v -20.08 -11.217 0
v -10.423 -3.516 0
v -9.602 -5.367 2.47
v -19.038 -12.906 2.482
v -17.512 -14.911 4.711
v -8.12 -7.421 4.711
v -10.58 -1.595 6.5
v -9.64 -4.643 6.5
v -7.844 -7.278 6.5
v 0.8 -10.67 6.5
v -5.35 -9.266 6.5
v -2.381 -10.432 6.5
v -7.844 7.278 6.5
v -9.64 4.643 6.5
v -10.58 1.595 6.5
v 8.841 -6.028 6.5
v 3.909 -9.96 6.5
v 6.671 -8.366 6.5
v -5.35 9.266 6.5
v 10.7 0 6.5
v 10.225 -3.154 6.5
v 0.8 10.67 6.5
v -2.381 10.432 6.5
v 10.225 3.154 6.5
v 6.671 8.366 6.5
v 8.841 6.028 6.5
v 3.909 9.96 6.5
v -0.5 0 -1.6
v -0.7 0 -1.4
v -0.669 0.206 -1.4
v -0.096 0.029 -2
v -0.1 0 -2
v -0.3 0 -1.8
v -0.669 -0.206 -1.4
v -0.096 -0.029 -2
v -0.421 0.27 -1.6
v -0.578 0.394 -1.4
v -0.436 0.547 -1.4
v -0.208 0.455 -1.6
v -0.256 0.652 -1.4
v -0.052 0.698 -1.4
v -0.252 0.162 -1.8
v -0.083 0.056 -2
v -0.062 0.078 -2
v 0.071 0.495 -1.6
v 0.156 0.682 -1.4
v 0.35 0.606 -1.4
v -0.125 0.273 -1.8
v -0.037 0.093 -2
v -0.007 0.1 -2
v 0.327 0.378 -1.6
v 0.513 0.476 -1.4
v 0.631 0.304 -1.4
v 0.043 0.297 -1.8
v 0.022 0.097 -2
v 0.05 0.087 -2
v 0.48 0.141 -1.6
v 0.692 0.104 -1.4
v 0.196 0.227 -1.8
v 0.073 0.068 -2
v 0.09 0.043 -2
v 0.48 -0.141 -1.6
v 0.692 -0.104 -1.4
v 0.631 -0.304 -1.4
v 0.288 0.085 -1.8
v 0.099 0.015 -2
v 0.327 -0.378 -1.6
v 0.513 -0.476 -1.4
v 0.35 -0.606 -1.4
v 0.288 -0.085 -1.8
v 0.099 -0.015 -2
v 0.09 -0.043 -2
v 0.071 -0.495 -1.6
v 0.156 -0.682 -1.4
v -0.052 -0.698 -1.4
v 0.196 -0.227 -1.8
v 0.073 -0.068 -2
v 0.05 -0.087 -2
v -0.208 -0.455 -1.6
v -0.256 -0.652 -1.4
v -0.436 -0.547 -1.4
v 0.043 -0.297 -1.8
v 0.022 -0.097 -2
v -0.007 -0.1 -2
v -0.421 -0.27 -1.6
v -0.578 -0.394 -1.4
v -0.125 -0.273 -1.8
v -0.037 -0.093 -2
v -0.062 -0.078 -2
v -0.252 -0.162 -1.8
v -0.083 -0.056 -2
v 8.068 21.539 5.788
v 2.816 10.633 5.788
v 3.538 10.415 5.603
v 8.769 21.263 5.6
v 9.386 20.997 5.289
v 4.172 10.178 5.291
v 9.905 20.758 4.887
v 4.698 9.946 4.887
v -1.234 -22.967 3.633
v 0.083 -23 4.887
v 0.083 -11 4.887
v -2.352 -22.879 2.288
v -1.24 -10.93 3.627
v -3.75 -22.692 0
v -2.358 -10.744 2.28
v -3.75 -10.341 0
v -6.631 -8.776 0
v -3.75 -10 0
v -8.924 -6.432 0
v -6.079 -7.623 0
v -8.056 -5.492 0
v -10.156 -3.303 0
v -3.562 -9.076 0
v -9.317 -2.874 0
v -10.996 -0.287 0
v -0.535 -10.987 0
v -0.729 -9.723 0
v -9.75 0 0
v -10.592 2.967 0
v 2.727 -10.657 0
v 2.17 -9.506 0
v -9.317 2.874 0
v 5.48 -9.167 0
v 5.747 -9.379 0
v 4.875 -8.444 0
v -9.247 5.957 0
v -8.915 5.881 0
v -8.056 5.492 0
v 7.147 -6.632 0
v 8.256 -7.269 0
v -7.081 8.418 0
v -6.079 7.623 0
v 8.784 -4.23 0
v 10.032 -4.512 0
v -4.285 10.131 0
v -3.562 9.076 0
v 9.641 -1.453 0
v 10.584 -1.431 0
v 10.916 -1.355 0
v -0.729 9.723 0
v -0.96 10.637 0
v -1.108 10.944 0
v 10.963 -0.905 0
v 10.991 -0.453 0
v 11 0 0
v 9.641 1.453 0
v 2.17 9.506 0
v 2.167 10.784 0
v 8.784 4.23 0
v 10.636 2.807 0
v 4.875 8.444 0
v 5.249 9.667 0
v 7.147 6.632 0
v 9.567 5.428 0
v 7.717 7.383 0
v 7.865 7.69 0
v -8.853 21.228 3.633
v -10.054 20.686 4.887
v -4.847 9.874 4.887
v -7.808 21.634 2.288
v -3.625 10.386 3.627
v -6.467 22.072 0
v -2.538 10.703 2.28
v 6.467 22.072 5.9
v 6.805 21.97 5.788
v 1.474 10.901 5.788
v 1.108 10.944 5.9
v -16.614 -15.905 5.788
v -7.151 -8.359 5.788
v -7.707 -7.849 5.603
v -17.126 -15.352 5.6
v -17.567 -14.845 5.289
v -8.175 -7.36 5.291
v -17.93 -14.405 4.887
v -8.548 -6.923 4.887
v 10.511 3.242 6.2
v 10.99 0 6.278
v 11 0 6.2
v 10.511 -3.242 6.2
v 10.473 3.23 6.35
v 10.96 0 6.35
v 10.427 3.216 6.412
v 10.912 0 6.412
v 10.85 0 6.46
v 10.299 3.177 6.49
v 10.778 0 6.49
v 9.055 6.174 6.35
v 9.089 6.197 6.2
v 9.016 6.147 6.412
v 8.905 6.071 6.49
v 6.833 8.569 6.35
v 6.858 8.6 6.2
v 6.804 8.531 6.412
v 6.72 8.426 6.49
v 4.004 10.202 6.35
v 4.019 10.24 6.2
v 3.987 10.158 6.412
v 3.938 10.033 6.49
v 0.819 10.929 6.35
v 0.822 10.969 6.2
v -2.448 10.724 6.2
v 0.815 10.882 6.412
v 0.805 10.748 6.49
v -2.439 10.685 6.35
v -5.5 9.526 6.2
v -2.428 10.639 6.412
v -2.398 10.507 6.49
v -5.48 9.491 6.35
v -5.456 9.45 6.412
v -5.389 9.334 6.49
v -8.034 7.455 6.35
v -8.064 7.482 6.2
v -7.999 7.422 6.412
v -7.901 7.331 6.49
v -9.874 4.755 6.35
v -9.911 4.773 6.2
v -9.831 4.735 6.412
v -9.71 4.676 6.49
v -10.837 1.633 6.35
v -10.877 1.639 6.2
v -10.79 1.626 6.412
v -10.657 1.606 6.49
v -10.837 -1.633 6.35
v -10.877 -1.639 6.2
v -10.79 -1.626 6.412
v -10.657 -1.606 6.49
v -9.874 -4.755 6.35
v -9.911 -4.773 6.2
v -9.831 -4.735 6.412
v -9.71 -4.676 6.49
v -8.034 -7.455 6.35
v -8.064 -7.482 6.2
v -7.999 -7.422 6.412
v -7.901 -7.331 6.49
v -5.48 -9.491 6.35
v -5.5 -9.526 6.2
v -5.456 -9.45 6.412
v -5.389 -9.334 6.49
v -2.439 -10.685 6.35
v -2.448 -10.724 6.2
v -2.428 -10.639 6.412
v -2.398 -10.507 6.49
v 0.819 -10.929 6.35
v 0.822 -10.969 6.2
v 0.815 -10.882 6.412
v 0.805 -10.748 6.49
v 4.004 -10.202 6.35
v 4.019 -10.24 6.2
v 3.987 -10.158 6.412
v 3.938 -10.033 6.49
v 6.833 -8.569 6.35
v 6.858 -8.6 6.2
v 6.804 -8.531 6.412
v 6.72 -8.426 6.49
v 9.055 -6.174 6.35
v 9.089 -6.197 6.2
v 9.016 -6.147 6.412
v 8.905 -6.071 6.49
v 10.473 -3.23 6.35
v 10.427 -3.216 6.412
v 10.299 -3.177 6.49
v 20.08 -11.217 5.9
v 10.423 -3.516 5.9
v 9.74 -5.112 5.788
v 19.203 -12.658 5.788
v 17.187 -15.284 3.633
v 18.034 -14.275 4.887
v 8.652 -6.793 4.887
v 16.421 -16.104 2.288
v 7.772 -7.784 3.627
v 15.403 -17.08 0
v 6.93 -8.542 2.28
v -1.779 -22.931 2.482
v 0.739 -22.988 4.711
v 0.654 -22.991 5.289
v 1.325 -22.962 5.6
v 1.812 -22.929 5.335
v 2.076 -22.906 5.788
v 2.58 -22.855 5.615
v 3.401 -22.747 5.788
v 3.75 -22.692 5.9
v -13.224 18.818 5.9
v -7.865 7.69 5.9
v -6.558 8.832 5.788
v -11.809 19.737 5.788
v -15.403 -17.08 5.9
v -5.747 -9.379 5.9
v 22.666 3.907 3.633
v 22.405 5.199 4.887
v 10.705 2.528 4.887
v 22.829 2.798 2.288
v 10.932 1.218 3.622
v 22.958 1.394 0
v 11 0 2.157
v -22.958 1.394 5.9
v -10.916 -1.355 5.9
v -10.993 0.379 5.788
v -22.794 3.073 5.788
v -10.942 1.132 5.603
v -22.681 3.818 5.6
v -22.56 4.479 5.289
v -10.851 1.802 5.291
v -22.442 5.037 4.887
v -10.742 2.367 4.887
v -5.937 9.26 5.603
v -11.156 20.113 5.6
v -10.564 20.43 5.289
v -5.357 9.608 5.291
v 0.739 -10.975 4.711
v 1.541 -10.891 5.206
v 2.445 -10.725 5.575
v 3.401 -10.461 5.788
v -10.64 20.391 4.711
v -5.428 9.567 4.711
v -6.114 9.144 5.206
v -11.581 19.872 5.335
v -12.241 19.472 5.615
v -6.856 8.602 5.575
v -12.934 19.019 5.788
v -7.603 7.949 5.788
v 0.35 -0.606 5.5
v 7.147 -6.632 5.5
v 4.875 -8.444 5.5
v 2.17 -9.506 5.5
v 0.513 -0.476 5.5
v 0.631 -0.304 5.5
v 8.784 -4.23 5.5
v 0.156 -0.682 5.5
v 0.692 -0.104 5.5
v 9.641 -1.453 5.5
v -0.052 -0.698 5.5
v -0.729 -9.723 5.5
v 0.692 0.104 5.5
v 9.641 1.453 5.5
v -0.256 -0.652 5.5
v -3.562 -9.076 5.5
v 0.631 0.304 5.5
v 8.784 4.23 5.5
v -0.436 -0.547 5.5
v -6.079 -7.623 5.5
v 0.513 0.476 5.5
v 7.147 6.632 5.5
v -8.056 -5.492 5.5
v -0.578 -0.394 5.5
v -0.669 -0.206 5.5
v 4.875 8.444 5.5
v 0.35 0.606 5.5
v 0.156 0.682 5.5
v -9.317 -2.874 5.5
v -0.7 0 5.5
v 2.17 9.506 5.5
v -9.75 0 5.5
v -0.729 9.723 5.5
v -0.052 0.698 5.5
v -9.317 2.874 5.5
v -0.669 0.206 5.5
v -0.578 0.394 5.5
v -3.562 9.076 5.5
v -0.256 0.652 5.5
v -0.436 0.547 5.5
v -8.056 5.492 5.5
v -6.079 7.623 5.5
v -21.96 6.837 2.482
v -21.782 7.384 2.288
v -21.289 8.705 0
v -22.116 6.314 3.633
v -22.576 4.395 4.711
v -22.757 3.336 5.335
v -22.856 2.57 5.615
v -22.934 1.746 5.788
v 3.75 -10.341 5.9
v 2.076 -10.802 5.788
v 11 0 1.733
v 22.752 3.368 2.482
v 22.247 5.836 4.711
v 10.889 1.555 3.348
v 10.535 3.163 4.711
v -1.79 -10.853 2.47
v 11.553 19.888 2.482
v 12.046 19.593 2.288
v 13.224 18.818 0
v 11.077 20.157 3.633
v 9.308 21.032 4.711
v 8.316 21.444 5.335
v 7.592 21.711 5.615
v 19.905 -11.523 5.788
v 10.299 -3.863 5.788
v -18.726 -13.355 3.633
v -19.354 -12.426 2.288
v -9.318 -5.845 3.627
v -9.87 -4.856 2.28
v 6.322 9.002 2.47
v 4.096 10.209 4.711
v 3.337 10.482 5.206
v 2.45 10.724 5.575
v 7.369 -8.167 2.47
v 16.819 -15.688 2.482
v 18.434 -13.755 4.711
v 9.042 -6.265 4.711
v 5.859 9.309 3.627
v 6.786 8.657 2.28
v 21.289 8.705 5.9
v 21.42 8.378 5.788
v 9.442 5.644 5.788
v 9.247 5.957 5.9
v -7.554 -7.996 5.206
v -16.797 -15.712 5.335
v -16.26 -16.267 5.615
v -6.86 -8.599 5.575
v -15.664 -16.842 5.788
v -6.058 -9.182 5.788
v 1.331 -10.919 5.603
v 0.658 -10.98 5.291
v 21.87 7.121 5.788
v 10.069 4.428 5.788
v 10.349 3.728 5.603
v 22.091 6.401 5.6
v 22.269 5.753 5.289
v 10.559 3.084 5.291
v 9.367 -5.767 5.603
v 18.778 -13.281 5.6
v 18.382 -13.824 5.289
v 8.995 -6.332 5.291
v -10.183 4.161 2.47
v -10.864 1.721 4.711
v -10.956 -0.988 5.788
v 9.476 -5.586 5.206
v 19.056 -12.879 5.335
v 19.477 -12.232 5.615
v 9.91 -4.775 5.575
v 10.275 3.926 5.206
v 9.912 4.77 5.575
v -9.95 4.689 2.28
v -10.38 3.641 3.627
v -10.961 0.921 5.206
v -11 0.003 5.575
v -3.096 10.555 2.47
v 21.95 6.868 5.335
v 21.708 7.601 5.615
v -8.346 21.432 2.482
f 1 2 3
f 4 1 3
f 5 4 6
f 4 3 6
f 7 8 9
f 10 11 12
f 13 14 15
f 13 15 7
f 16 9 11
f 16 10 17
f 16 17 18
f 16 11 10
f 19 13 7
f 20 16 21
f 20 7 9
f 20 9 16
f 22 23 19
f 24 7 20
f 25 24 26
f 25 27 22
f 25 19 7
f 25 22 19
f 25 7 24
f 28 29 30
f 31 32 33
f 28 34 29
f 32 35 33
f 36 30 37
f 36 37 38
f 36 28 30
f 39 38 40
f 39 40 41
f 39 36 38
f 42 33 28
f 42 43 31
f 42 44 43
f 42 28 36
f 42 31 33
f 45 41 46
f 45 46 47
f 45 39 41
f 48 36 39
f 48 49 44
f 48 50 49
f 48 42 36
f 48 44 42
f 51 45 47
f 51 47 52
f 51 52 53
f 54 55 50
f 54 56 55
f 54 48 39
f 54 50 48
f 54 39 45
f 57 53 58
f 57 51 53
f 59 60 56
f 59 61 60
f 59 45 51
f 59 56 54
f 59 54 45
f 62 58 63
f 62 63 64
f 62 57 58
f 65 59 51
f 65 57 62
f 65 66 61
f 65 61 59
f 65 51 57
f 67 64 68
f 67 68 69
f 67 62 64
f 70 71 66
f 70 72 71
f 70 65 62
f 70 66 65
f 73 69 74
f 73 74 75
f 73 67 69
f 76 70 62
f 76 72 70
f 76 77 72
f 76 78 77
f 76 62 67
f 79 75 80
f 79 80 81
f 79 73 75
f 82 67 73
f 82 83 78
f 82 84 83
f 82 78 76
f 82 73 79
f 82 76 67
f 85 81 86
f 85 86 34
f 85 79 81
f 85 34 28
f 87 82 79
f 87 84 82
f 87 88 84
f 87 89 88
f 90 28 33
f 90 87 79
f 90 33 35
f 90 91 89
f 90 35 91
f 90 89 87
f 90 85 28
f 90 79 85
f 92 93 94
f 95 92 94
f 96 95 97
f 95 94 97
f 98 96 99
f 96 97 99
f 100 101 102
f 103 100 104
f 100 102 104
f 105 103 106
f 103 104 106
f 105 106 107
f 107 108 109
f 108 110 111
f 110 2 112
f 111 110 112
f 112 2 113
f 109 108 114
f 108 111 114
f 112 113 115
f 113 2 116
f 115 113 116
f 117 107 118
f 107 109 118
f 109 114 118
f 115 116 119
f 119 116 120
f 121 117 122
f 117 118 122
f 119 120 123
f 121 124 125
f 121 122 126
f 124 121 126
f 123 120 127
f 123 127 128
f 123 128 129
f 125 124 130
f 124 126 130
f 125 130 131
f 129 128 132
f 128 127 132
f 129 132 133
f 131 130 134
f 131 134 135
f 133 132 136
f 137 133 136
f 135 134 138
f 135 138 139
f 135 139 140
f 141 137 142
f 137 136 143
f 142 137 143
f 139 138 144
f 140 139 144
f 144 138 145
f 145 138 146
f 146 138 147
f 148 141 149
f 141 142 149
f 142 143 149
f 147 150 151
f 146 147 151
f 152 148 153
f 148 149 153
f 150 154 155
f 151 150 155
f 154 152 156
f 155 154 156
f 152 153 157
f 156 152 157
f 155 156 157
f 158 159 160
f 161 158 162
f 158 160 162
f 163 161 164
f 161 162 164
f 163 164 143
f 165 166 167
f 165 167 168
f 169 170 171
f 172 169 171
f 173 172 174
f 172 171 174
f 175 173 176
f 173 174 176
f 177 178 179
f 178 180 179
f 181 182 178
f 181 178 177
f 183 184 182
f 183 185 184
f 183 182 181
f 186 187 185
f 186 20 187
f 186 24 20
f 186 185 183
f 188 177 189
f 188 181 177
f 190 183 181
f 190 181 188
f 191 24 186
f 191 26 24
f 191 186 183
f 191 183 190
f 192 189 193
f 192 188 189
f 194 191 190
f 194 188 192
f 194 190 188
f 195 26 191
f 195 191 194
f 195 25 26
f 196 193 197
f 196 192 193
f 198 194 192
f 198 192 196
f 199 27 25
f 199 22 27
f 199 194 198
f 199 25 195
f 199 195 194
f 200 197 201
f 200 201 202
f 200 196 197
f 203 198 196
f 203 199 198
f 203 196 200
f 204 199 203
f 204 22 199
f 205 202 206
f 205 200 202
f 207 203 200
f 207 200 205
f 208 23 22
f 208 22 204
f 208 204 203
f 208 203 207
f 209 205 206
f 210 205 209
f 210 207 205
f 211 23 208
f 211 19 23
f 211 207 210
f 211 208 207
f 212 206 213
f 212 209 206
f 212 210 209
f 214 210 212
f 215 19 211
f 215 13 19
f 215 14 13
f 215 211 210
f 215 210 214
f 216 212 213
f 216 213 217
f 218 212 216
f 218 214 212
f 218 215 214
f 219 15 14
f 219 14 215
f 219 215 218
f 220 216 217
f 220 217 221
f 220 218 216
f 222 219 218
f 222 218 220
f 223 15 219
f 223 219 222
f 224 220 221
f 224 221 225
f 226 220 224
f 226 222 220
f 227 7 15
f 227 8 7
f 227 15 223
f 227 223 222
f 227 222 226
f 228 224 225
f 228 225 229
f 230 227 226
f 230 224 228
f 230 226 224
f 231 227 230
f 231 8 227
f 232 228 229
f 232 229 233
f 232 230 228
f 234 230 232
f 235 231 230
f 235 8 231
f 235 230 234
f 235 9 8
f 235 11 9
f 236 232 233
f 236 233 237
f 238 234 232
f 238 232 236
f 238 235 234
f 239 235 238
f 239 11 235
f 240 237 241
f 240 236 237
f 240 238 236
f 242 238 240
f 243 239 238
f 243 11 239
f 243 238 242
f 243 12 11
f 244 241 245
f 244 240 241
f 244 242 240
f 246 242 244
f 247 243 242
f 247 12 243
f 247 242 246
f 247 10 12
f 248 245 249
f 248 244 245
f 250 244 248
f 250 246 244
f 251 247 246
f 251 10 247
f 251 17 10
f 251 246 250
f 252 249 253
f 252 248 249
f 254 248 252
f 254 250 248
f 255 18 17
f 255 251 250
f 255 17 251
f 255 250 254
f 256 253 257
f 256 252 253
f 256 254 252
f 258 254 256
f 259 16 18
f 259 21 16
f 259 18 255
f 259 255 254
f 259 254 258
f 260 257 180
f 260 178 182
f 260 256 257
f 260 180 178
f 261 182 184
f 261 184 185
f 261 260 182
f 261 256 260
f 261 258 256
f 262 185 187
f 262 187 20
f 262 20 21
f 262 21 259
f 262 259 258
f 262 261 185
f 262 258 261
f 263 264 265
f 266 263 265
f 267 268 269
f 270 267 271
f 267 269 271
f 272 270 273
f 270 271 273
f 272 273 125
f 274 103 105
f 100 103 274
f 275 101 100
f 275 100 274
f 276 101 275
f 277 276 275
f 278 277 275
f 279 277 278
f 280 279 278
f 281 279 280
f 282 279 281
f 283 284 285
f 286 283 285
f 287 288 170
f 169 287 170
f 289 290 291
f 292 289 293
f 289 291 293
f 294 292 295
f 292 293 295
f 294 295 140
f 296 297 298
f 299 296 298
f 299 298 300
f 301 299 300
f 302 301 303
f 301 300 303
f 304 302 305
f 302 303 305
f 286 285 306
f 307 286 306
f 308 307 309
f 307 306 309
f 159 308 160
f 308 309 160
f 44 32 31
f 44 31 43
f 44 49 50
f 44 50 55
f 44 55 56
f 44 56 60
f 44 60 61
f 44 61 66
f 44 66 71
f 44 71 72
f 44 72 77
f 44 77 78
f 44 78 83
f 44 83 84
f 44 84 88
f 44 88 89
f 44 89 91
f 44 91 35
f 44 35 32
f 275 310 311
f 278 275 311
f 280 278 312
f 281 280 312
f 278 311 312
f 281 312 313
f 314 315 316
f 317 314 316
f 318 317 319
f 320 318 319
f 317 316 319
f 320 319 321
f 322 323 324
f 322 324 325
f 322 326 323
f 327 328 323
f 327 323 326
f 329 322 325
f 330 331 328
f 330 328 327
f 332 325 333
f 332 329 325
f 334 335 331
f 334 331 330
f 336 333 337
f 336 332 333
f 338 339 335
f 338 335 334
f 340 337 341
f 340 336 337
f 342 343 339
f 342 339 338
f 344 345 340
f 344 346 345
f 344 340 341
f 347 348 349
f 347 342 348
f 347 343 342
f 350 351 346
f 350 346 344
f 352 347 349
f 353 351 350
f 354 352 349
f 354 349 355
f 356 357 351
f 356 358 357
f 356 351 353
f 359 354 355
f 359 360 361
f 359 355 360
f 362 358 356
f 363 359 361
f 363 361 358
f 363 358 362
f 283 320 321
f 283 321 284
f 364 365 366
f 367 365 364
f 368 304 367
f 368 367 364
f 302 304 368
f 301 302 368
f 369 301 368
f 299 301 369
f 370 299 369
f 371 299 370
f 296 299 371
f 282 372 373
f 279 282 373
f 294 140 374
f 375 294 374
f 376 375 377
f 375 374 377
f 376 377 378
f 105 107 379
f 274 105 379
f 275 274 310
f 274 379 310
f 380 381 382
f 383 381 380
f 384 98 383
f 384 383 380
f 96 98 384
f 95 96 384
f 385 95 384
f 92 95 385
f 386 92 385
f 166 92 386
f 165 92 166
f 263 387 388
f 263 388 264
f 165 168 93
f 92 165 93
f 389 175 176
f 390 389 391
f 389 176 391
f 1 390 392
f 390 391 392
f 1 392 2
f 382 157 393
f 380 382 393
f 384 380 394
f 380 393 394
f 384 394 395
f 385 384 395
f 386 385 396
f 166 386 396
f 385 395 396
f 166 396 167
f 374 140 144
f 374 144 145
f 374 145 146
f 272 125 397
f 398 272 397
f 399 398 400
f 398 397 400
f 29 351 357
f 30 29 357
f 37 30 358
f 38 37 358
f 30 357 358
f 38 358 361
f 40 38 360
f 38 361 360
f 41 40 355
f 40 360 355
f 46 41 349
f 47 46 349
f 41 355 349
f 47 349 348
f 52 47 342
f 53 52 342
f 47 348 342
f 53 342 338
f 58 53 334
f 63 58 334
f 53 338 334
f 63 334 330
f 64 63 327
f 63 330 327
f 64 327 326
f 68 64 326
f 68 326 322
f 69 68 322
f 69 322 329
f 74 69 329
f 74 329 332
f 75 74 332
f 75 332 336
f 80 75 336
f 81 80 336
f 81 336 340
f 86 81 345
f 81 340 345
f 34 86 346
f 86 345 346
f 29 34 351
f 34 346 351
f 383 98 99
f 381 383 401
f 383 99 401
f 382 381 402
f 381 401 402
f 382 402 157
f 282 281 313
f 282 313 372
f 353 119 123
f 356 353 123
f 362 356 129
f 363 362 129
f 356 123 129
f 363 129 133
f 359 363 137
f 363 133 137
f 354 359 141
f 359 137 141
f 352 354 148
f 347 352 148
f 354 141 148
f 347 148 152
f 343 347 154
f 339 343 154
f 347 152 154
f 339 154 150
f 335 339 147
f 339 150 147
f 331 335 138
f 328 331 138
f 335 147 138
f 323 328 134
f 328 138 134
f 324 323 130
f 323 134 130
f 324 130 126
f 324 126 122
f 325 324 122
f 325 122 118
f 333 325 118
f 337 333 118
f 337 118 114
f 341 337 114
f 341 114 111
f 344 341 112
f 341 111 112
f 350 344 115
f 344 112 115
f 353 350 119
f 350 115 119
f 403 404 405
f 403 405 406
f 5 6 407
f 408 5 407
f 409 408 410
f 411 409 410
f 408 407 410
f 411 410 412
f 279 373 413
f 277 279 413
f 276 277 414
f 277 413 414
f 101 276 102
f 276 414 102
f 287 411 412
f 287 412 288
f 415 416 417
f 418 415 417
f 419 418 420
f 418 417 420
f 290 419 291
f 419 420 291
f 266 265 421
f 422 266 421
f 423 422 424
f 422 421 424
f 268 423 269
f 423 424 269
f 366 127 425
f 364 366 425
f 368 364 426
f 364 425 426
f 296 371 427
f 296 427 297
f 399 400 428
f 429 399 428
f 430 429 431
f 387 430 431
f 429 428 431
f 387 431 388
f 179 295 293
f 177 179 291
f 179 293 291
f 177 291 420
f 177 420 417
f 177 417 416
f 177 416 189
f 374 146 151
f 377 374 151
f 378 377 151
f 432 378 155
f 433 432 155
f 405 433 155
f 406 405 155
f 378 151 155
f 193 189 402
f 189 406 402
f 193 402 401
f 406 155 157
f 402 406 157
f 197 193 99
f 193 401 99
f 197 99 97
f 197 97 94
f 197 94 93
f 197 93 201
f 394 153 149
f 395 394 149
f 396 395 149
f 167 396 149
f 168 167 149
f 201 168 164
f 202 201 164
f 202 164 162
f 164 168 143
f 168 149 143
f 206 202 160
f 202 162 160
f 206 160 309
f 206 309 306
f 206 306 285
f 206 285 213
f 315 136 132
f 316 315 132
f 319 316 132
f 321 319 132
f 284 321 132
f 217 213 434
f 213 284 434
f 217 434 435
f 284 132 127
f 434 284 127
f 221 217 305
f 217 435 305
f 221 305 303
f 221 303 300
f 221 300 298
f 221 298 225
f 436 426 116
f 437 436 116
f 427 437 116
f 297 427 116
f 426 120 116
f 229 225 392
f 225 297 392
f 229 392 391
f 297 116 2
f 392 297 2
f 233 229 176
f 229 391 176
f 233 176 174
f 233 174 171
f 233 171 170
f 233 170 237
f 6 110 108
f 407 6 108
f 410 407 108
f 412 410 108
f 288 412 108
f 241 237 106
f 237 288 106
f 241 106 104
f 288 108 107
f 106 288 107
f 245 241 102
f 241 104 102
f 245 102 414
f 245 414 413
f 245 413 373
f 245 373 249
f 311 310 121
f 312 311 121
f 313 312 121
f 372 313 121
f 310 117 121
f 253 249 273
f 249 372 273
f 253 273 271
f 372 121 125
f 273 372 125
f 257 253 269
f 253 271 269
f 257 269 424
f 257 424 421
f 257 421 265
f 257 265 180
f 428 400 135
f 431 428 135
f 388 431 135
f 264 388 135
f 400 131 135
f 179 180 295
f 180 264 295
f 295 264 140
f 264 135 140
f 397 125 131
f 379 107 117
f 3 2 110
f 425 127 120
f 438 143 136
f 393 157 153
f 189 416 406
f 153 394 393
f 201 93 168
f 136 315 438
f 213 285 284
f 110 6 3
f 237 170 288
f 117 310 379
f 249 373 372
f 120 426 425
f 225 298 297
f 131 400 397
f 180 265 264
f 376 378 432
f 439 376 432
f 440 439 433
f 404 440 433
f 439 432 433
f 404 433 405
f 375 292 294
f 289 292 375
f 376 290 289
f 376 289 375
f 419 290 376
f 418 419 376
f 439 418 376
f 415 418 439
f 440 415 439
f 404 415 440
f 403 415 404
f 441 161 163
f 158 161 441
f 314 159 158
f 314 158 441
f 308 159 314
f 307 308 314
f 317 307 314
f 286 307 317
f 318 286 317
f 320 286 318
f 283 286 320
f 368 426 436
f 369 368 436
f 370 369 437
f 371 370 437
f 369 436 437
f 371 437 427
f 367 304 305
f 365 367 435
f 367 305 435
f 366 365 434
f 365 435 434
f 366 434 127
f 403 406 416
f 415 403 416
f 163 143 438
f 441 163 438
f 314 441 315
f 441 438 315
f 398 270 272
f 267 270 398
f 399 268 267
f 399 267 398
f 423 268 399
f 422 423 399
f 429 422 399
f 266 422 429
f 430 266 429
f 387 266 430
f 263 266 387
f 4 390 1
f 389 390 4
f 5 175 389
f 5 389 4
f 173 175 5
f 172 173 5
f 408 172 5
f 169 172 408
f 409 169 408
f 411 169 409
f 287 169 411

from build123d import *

# Parameters (mm, degrees)
SKETCH_1_R               = 11
EXTRUDE_1_DEPTH          = 6.5
SKETCH_2_R               = 9.75
CUT_EXTRUDE_1_DEPTH      = 5.5
SKETCH_3_R               = 0.7
EXTRUDE_2_DEPTH          = 7.5
CHAMFER_1_SIZE           = 0.6
EXTRUDE_START            = -10
EXTRUDE_3_DEPTH          = 23
PATTERN_CIRCULAR_1_COUNT = 7
FILLET_1_R               = 0.3
SKETCH_5_OUTSIDE_W       = 86.532
SKETCH_5_OUTSIDE_H       = 84.877
SKETCH_5_OUTSIDE_R       = 23
CUT_EXTRUDE_2_DEPTH      = 23


with BuildPart() as part:
    # Эскиз1 → Бобышка-Вытянуть1 (new body)
    with BuildSketch(Plane.XY):
        Circle(SKETCH_1_R)
    extrude(amount=EXTRUDE_1_DEPTH)

    # Эскиз2 → Вырез-Вытянуть1 (cut)
    with BuildSketch(Plane(origin=(0, 0, 0), x_dir=(-1, 0, 0), z_dir=(0, 0, -1))):
        Circle(SKETCH_2_R)
    extrude(amount=-CUT_EXTRUDE_1_DEPTH, mode=Mode.SUBTRACT)

    # Эскиз3 → Бобышка-Вытянуть2 (add)
    with BuildSketch(Plane(origin=(0, 0, 5.5), x_dir=(-1, 0, 0), z_dir=(0, 0, -1))):
        Circle(SKETCH_3_R)
    extrude(amount=EXTRUDE_2_DEPTH)

    # Фаска1
    chamfer_1_edges = [part.edges().sort_by_distance(p)[0] for p in [
        (0.7, 0, -2),
    ]]
    chamfer(chamfer_1_edges, length=CHAMFER_1_SIZE)

    # Эскиз4 → Бобышка-Вытянуть3 (add)
    with BuildSketch(Plane(origin=(0, 0, 0), x_dir=(1, 0, 0), z_dir=(0, 1, 0)).offset(EXTRUDE_START)):
        with BuildLine():
            ThreePointArc((3.75, -5.9), (2.910954768, -5.877455841), (2.076425924, -5.787640746))
            ThreePointArc((2.076425924, -5.787640746), (1.016898237, -5.476222818), (0.082906283, -4.886952865))
            ThreePointArc((0.082906283, -4.886952865), (-2.084101368, -2.63998988), (-3.75, 0))
            ThreePointArc((-3.75, 0), (-1.712075741, -2.552424329), (0.739315837, -4.710822941))
            ThreePointArc((0.739315837, -4.710822941), (2.002660979, -5.416468702), (3.40130611, -5.787640746))
            ThreePointArc((3.40130611, -5.787640746), (3.575082247, -5.845591808), (3.75, -5.9))
        make_face()
    extrude_3 = extrude(amount=-EXTRUDE_3_DEPTH)

    # Круговой массив1: Бобышка-Вытянуть3 ×7 about axis
    pattern_circular_1_axis = Axis((0, 0, 6.5), (0, 0, -1))
    for i in range(1, PATTERN_CIRCULAR_1_COUNT):
        add(extrude_3.rotate(pattern_circular_1_axis, i * 360 / PATTERN_CIRCULAR_1_COUNT))

    # Скругление1
    fillet_1_edges = [part.edges().sort_by_distance(p)[0] for p in [
        (-11, 0, 6.5),
    ]]
    fillet(fillet_1_edges, radius=FILLET_1_R)

    # Эскиз5 outside → Вырез-Вытянуть2 (cut)
    with BuildSketch(Plane.XY.offset(6.5)):
        with Locations((0, -0.8205)):
            Rectangle(SKETCH_5_OUTSIDE_W, SKETCH_5_OUTSIDE_H)
        Circle(SKETCH_5_OUTSIDE_R, mode=Mode.SUBTRACT)
    extrude(amount=-CUT_EXTRUDE_2_DEPTH, mode=Mode.SUBTRACT)


solid = part.part
